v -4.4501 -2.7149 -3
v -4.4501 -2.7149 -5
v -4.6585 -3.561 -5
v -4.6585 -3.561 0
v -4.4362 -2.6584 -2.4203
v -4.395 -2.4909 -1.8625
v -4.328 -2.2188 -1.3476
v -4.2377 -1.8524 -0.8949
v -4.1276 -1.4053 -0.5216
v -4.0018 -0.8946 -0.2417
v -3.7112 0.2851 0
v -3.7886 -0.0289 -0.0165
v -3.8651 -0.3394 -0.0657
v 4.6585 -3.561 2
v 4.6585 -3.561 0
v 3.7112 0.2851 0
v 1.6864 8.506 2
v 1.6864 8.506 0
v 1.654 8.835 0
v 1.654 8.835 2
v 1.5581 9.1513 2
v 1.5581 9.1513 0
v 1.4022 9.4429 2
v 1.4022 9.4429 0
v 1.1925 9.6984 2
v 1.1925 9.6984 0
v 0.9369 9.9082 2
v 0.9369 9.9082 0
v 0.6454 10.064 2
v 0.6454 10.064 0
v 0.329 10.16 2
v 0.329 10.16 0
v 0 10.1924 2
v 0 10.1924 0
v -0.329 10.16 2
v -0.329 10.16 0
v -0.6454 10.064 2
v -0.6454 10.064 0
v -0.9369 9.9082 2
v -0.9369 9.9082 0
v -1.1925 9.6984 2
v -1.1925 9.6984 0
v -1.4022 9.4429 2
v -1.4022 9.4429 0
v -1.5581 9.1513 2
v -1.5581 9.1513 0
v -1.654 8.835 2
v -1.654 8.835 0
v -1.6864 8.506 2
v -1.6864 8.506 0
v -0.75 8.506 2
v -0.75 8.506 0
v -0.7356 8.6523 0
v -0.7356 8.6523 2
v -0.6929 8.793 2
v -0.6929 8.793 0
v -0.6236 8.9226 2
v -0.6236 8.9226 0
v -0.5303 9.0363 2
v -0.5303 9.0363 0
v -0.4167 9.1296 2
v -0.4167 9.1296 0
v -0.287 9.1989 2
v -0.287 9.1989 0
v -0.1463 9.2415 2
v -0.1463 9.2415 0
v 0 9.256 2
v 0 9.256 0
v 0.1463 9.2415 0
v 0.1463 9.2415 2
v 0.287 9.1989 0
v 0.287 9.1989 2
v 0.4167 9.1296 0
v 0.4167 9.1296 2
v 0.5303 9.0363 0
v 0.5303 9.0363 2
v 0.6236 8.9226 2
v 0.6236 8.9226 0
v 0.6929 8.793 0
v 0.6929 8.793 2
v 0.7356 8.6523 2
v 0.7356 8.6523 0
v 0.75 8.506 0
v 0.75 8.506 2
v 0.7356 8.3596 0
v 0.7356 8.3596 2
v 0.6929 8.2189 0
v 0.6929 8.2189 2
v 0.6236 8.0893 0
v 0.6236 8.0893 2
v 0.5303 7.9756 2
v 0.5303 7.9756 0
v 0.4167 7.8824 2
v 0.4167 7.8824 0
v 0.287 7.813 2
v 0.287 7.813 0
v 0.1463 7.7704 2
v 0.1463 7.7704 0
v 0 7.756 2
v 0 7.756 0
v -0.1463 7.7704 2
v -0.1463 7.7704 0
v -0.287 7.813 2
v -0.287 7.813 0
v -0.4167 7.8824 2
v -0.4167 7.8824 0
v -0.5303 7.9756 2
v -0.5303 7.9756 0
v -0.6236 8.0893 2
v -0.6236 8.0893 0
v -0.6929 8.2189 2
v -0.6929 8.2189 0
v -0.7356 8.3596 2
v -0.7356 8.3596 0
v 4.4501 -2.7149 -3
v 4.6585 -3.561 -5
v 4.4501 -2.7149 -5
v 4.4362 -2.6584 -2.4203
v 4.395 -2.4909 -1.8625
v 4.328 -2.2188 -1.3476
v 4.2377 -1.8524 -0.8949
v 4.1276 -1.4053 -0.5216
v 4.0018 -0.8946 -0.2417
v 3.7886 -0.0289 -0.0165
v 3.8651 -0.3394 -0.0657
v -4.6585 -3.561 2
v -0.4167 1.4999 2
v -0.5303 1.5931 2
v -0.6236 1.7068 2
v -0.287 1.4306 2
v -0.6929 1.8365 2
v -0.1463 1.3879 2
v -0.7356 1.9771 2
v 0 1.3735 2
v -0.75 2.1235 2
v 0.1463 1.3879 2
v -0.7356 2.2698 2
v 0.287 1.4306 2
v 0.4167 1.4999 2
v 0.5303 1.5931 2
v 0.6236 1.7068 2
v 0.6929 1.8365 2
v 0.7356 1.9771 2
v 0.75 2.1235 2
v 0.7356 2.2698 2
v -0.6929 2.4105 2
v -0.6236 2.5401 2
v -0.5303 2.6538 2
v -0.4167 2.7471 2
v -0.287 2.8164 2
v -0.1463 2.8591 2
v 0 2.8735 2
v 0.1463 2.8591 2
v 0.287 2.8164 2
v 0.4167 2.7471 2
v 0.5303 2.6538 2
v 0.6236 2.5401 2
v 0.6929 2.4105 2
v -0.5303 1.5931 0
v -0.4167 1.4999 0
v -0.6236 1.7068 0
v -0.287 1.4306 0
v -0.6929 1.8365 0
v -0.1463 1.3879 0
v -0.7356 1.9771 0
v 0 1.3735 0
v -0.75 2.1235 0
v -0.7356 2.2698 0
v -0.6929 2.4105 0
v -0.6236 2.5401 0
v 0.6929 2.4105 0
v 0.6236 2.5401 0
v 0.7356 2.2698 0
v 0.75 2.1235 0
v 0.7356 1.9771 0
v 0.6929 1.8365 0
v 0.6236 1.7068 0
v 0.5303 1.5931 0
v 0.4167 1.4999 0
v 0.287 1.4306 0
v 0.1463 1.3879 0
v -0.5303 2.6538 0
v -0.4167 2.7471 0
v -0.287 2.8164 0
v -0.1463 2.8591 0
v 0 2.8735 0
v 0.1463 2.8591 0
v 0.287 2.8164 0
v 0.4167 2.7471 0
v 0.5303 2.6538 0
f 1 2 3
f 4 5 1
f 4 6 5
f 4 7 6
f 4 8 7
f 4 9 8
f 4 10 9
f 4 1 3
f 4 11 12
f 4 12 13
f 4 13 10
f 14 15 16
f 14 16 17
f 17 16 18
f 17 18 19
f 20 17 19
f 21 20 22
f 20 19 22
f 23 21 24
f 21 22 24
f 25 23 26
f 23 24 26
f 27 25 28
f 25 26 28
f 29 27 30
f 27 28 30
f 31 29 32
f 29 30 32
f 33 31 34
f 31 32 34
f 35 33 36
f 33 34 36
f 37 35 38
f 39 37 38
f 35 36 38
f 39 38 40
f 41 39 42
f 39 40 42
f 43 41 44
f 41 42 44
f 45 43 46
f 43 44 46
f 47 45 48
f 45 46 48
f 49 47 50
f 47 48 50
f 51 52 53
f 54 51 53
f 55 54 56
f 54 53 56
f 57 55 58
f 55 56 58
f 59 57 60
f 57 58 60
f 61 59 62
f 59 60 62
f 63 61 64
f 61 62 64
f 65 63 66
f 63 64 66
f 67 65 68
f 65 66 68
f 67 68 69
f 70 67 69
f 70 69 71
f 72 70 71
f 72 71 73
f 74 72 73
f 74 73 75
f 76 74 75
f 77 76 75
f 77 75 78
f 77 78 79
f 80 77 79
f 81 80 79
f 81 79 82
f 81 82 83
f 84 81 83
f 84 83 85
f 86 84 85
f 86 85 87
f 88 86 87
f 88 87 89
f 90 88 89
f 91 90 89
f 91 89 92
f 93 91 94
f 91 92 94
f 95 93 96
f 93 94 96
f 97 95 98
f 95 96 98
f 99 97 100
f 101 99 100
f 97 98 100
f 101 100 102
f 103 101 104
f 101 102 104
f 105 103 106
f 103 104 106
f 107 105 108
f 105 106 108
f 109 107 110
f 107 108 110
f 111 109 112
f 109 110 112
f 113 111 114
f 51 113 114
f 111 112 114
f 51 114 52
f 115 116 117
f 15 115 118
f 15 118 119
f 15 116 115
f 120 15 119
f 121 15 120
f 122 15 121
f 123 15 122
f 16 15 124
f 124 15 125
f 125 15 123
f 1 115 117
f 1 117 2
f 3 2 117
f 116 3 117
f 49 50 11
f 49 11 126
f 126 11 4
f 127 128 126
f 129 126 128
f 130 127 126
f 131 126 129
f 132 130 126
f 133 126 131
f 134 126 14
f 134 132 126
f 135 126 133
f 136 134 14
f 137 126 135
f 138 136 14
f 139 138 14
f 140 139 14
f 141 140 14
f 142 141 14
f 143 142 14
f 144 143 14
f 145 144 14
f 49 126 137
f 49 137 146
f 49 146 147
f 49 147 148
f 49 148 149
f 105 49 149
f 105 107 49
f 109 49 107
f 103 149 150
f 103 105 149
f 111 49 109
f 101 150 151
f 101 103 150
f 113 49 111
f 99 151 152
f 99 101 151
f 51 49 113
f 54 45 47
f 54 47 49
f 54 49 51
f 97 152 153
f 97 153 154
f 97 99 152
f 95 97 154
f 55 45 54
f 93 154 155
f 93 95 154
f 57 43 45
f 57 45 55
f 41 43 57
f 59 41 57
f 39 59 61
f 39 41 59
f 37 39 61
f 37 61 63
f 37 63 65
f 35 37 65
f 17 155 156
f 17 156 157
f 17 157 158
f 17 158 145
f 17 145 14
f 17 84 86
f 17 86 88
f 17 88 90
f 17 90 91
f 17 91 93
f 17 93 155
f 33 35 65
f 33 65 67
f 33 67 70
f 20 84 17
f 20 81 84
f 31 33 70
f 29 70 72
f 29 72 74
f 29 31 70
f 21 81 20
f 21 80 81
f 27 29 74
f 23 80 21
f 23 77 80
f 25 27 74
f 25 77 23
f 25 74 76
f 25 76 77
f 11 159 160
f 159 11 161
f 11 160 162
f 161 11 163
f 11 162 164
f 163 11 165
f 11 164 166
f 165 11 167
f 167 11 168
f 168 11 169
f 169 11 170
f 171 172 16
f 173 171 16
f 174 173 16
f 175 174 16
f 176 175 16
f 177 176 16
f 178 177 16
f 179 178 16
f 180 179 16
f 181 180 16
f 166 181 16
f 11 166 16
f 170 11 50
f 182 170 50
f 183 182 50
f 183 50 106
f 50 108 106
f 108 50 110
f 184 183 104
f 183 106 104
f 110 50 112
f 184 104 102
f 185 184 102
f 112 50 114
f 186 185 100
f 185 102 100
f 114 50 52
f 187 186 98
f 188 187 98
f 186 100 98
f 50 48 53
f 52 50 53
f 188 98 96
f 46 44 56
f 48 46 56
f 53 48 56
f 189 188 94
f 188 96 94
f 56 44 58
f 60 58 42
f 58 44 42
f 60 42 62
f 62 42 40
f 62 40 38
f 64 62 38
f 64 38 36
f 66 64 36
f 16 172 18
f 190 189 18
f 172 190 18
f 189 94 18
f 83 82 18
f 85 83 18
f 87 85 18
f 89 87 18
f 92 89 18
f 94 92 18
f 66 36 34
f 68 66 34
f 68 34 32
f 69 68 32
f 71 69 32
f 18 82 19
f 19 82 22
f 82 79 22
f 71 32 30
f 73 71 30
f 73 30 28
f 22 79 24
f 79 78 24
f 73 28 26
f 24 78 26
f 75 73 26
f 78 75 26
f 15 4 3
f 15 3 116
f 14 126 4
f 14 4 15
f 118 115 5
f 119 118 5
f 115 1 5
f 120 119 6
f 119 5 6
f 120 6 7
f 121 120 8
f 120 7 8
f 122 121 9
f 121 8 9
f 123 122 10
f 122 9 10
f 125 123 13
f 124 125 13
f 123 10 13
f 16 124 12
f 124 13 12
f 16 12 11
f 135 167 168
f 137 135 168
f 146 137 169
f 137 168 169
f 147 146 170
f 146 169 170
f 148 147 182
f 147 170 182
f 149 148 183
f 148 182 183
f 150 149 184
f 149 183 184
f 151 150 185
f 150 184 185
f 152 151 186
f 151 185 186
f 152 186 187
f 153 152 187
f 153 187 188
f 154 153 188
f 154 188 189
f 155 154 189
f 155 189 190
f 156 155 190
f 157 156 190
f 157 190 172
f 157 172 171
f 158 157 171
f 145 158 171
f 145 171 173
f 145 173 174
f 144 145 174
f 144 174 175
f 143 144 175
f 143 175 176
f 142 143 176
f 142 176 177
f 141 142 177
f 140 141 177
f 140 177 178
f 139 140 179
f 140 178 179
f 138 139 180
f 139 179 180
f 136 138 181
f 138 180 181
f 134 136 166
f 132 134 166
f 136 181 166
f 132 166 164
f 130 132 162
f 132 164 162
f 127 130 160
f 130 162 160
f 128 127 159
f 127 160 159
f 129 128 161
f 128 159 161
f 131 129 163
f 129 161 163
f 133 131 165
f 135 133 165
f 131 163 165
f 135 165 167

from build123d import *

# Parameters (mm, degrees)
BOSS_EXTRUDE1_DEPTH   = 2
BOSS_EXTRUDE2_DEPTH   = 5
FILLET1_R             = 3
F_1_5MM_DOWEL_HOLE1_D = 1.5


with BuildPart() as part:
    # Sketch1 → Boss-Extrude1 (new body)
    with BuildSketch(Plane.XY):
        with BuildLine():
            Line((-1.686437718, 8.505953435), (-4.658536585, -3.56097561))
            Line((-4.658536585, -3.56097561), (4.658536585, -3.56097561))
            Line((4.658536585, -3.56097561), (1.686437718, 8.505953435))
            ThreePointArc((1.686437718, 8.505953435), (0, 10.192391153), (-1.686437718, 8.505953435))
        make_face()
    extrude(amount=BOSS_EXTRUDE1_DEPTH)

    # Sketch2 → Boss-Extrude2 (add)
    with BuildSketch(Plane(origin=(0, 0, 0), x_dir=(-1, 0, 0), z_dir=(0, 0, -1))):
        Polygon((-4.450149656, -2.714910119), (4.450149656, -2.714910119), (4.658536585, -3.56097561), (-4.658536585, -3.56097561), align=None)
    extrude(amount=BOSS_EXTRUDE2_DEPTH)

    # Fillet1
    fillet1_edges = [part.edges().sort_by_distance(p)[0] for p in [
        (0, -2.714910119, 0),
    ]]
    fillet(fillet1_edges, radius=FILLET1_R)

    # Ø1.5mm Dowel Hole1 (through all)
    with Locations(Plane.XY.offset(2)):
        with Locations((0, 8.505953435), (0, 2.123465087)):
            Hole(F_1_5MM_DOWEL_HOLE1_D / 2)


solid = part.part
